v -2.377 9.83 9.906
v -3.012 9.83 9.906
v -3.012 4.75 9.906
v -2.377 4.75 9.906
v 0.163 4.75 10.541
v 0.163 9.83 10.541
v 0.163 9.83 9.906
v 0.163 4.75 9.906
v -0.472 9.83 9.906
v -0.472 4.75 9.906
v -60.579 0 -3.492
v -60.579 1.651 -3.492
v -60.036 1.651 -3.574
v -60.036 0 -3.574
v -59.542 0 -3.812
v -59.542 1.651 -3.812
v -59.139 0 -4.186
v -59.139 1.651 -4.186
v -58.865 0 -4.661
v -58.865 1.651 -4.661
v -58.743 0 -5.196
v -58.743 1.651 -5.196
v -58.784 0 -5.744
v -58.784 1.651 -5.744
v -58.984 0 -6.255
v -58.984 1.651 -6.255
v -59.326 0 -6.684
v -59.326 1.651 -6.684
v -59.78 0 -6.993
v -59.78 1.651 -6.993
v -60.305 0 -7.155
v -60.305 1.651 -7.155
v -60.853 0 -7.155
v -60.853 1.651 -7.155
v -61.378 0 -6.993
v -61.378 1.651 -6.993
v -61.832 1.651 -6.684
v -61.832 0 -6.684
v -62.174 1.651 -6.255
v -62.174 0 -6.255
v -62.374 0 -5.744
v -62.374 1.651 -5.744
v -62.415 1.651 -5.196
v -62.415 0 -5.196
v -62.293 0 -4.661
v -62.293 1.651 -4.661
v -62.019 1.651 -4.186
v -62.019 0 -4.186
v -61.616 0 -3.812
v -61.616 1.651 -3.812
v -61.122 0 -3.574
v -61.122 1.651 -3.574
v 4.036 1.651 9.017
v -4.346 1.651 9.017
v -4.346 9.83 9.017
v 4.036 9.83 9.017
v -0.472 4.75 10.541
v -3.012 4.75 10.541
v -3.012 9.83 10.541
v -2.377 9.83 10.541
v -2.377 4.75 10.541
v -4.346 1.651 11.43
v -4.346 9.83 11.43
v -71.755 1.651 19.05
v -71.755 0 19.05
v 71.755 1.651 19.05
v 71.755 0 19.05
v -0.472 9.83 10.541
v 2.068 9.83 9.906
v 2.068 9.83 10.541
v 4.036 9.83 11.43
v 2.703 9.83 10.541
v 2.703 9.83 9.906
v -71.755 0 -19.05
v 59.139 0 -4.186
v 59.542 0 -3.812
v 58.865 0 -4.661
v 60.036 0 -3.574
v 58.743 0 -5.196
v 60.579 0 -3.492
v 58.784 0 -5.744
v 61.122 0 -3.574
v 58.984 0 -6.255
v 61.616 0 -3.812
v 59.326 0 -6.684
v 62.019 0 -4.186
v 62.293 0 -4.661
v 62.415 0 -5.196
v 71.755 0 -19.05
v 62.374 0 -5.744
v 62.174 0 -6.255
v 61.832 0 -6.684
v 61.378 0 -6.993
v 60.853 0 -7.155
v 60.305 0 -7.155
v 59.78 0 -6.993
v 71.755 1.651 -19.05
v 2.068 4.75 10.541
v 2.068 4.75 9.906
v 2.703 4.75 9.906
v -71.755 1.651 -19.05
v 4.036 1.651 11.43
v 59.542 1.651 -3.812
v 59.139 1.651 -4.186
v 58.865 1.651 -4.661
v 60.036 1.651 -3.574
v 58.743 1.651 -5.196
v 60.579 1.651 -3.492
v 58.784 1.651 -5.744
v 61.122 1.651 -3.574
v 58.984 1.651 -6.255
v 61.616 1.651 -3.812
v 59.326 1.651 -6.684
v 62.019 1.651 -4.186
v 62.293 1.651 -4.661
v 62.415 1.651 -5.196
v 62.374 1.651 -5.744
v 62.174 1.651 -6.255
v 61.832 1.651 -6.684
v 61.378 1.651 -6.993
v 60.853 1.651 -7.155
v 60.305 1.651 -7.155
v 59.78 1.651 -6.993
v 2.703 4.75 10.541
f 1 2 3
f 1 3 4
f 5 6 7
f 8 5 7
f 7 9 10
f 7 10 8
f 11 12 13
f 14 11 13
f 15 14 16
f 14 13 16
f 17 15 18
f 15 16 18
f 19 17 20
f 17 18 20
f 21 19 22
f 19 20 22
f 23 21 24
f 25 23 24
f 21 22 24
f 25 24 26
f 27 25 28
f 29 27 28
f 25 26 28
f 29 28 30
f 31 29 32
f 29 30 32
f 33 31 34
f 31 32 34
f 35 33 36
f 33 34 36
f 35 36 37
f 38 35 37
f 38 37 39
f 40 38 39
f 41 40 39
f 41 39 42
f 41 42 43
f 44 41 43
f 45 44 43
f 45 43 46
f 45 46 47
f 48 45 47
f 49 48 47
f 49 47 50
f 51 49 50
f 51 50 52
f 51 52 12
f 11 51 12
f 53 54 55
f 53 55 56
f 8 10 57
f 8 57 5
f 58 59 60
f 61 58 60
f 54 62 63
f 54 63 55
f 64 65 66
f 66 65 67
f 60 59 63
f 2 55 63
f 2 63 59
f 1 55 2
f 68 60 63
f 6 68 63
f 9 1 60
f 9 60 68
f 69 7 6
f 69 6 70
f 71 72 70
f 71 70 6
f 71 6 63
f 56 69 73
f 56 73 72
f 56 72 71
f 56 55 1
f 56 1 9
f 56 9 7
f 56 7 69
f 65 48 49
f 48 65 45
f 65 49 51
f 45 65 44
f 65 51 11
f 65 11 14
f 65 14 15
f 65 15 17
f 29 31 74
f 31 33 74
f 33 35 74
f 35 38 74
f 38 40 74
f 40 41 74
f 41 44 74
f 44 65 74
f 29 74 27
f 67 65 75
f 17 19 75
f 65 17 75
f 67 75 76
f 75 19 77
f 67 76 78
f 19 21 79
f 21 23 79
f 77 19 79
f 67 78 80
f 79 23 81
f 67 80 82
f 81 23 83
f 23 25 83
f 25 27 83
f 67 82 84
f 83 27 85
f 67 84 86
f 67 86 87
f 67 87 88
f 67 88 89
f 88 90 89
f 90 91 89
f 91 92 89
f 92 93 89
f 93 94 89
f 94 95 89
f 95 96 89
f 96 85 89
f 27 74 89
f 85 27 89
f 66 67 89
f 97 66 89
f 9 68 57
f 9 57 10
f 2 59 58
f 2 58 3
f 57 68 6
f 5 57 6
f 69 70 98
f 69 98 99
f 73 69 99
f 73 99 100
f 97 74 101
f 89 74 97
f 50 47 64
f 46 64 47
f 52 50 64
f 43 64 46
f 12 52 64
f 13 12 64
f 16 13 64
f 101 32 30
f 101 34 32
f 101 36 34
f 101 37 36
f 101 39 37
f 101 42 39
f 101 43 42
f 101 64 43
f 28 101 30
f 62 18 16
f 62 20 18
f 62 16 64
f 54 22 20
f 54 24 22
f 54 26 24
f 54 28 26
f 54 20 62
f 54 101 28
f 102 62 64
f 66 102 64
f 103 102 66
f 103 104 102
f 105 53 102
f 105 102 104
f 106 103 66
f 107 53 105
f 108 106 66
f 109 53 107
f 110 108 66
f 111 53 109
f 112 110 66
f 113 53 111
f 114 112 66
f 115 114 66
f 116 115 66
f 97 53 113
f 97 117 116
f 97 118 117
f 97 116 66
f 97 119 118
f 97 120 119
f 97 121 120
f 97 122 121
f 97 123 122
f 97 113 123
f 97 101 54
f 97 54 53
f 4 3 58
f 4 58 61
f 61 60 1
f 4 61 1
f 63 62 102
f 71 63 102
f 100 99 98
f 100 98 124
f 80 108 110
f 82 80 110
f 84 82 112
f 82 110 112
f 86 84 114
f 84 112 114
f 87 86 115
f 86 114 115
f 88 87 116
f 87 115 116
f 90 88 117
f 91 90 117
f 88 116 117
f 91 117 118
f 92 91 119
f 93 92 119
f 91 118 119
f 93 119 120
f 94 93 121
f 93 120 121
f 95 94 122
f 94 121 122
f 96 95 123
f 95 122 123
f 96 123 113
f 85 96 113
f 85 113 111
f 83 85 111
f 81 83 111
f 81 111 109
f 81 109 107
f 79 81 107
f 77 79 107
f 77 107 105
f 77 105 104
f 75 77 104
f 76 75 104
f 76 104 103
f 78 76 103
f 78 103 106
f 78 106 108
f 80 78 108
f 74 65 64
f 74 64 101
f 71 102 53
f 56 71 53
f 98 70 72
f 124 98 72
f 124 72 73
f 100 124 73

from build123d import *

# Parameters (mm, degrees)
ESQUISSE1_W             = 143.51
ESQUISSE1_H             = 38.1
BOSS_EXTRU_1_DEPTH      = 1.651
ESQUISSE2_R             = 1.8415
ENL_V_MAT_EXTRU_1_DEPTH = 75.259062248
ESQUISSE3_W             = 8.382
ESQUISSE3_H             = 2.413
BOSS_EXTRU_2_DEPTH      = 8.1788
ESQUISSE4_W             = 0.635
ESQUISSE4_H             = 0.635
ENL_V_MAT_EXTRU_2_DEPTH = 5.08


with BuildPart() as part:
    # Esquisse1 → Boss.-Extru.1 (new body)
    with BuildSketch(Plane(origin=(0, 0, 0), x_dir=(1, 0, 0), z_dir=(0, 1, 0))):
        Rectangle(ESQUISSE1_W, ESQUISSE1_H)
    extrude(amount=BOSS_EXTRU_1_DEPTH)

    # Esquisse2 → Enlèv. mat.-Extru.1 (cut, through all)
    with BuildSketch(Plane(origin=(0, 1.651, 0), x_dir=(1, 0, 0), z_dir=(0, 1, 0))):
        with Locations(Location((60.579, 5.334, 0), (0, 0, 270))):
            Circle(ESQUISSE2_R)
        with Locations(Location((-60.579, 5.334, 0), (0, 0, 270))):
            Circle(ESQUISSE2_R)
    extrude(amount=-ENL_V_MAT_EXTRU_1_DEPTH, mode=Mode.SUBTRACT)

    # Esquisse3 → Boss.-Extru.2 (add)
    with BuildSketch(Plane(origin=(0, 1.651, 0), x_dir=(1, 0, 0), z_dir=(0, 1, 0))):
        with Locations((-0.154698586, -10.2235)):
            Rectangle(ESQUISSE3_W, ESQUISSE3_H)
    extrude(amount=BOSS_EXTRU_2_DEPTH)

    # Esquisse4 → Enlèv. mat.-Extru.2 (cut)
    with BuildSketch(Plane(origin=(0, 9.8298, 0), x_dir=(1, 0, 0), z_dir=(0, 1, 0))):
        with Locations((-0.154698586, -10.2235)):
            Rectangle(ESQUISSE4_W, ESQUISSE4_H)
        with Locations((-2.694698586, -10.2235)):
            Rectangle(ESQUISSE4_W, ESQUISSE4_H)
        with Locations((2.385301414, -10.2235)):
            Rectangle(ESQUISSE4_W, ESQUISSE4_H)
    extrude(amount=-ENL_V_MAT_EXTRU_2_DEPTH, mode=Mode.SUBTRACT)


solid = part.part
